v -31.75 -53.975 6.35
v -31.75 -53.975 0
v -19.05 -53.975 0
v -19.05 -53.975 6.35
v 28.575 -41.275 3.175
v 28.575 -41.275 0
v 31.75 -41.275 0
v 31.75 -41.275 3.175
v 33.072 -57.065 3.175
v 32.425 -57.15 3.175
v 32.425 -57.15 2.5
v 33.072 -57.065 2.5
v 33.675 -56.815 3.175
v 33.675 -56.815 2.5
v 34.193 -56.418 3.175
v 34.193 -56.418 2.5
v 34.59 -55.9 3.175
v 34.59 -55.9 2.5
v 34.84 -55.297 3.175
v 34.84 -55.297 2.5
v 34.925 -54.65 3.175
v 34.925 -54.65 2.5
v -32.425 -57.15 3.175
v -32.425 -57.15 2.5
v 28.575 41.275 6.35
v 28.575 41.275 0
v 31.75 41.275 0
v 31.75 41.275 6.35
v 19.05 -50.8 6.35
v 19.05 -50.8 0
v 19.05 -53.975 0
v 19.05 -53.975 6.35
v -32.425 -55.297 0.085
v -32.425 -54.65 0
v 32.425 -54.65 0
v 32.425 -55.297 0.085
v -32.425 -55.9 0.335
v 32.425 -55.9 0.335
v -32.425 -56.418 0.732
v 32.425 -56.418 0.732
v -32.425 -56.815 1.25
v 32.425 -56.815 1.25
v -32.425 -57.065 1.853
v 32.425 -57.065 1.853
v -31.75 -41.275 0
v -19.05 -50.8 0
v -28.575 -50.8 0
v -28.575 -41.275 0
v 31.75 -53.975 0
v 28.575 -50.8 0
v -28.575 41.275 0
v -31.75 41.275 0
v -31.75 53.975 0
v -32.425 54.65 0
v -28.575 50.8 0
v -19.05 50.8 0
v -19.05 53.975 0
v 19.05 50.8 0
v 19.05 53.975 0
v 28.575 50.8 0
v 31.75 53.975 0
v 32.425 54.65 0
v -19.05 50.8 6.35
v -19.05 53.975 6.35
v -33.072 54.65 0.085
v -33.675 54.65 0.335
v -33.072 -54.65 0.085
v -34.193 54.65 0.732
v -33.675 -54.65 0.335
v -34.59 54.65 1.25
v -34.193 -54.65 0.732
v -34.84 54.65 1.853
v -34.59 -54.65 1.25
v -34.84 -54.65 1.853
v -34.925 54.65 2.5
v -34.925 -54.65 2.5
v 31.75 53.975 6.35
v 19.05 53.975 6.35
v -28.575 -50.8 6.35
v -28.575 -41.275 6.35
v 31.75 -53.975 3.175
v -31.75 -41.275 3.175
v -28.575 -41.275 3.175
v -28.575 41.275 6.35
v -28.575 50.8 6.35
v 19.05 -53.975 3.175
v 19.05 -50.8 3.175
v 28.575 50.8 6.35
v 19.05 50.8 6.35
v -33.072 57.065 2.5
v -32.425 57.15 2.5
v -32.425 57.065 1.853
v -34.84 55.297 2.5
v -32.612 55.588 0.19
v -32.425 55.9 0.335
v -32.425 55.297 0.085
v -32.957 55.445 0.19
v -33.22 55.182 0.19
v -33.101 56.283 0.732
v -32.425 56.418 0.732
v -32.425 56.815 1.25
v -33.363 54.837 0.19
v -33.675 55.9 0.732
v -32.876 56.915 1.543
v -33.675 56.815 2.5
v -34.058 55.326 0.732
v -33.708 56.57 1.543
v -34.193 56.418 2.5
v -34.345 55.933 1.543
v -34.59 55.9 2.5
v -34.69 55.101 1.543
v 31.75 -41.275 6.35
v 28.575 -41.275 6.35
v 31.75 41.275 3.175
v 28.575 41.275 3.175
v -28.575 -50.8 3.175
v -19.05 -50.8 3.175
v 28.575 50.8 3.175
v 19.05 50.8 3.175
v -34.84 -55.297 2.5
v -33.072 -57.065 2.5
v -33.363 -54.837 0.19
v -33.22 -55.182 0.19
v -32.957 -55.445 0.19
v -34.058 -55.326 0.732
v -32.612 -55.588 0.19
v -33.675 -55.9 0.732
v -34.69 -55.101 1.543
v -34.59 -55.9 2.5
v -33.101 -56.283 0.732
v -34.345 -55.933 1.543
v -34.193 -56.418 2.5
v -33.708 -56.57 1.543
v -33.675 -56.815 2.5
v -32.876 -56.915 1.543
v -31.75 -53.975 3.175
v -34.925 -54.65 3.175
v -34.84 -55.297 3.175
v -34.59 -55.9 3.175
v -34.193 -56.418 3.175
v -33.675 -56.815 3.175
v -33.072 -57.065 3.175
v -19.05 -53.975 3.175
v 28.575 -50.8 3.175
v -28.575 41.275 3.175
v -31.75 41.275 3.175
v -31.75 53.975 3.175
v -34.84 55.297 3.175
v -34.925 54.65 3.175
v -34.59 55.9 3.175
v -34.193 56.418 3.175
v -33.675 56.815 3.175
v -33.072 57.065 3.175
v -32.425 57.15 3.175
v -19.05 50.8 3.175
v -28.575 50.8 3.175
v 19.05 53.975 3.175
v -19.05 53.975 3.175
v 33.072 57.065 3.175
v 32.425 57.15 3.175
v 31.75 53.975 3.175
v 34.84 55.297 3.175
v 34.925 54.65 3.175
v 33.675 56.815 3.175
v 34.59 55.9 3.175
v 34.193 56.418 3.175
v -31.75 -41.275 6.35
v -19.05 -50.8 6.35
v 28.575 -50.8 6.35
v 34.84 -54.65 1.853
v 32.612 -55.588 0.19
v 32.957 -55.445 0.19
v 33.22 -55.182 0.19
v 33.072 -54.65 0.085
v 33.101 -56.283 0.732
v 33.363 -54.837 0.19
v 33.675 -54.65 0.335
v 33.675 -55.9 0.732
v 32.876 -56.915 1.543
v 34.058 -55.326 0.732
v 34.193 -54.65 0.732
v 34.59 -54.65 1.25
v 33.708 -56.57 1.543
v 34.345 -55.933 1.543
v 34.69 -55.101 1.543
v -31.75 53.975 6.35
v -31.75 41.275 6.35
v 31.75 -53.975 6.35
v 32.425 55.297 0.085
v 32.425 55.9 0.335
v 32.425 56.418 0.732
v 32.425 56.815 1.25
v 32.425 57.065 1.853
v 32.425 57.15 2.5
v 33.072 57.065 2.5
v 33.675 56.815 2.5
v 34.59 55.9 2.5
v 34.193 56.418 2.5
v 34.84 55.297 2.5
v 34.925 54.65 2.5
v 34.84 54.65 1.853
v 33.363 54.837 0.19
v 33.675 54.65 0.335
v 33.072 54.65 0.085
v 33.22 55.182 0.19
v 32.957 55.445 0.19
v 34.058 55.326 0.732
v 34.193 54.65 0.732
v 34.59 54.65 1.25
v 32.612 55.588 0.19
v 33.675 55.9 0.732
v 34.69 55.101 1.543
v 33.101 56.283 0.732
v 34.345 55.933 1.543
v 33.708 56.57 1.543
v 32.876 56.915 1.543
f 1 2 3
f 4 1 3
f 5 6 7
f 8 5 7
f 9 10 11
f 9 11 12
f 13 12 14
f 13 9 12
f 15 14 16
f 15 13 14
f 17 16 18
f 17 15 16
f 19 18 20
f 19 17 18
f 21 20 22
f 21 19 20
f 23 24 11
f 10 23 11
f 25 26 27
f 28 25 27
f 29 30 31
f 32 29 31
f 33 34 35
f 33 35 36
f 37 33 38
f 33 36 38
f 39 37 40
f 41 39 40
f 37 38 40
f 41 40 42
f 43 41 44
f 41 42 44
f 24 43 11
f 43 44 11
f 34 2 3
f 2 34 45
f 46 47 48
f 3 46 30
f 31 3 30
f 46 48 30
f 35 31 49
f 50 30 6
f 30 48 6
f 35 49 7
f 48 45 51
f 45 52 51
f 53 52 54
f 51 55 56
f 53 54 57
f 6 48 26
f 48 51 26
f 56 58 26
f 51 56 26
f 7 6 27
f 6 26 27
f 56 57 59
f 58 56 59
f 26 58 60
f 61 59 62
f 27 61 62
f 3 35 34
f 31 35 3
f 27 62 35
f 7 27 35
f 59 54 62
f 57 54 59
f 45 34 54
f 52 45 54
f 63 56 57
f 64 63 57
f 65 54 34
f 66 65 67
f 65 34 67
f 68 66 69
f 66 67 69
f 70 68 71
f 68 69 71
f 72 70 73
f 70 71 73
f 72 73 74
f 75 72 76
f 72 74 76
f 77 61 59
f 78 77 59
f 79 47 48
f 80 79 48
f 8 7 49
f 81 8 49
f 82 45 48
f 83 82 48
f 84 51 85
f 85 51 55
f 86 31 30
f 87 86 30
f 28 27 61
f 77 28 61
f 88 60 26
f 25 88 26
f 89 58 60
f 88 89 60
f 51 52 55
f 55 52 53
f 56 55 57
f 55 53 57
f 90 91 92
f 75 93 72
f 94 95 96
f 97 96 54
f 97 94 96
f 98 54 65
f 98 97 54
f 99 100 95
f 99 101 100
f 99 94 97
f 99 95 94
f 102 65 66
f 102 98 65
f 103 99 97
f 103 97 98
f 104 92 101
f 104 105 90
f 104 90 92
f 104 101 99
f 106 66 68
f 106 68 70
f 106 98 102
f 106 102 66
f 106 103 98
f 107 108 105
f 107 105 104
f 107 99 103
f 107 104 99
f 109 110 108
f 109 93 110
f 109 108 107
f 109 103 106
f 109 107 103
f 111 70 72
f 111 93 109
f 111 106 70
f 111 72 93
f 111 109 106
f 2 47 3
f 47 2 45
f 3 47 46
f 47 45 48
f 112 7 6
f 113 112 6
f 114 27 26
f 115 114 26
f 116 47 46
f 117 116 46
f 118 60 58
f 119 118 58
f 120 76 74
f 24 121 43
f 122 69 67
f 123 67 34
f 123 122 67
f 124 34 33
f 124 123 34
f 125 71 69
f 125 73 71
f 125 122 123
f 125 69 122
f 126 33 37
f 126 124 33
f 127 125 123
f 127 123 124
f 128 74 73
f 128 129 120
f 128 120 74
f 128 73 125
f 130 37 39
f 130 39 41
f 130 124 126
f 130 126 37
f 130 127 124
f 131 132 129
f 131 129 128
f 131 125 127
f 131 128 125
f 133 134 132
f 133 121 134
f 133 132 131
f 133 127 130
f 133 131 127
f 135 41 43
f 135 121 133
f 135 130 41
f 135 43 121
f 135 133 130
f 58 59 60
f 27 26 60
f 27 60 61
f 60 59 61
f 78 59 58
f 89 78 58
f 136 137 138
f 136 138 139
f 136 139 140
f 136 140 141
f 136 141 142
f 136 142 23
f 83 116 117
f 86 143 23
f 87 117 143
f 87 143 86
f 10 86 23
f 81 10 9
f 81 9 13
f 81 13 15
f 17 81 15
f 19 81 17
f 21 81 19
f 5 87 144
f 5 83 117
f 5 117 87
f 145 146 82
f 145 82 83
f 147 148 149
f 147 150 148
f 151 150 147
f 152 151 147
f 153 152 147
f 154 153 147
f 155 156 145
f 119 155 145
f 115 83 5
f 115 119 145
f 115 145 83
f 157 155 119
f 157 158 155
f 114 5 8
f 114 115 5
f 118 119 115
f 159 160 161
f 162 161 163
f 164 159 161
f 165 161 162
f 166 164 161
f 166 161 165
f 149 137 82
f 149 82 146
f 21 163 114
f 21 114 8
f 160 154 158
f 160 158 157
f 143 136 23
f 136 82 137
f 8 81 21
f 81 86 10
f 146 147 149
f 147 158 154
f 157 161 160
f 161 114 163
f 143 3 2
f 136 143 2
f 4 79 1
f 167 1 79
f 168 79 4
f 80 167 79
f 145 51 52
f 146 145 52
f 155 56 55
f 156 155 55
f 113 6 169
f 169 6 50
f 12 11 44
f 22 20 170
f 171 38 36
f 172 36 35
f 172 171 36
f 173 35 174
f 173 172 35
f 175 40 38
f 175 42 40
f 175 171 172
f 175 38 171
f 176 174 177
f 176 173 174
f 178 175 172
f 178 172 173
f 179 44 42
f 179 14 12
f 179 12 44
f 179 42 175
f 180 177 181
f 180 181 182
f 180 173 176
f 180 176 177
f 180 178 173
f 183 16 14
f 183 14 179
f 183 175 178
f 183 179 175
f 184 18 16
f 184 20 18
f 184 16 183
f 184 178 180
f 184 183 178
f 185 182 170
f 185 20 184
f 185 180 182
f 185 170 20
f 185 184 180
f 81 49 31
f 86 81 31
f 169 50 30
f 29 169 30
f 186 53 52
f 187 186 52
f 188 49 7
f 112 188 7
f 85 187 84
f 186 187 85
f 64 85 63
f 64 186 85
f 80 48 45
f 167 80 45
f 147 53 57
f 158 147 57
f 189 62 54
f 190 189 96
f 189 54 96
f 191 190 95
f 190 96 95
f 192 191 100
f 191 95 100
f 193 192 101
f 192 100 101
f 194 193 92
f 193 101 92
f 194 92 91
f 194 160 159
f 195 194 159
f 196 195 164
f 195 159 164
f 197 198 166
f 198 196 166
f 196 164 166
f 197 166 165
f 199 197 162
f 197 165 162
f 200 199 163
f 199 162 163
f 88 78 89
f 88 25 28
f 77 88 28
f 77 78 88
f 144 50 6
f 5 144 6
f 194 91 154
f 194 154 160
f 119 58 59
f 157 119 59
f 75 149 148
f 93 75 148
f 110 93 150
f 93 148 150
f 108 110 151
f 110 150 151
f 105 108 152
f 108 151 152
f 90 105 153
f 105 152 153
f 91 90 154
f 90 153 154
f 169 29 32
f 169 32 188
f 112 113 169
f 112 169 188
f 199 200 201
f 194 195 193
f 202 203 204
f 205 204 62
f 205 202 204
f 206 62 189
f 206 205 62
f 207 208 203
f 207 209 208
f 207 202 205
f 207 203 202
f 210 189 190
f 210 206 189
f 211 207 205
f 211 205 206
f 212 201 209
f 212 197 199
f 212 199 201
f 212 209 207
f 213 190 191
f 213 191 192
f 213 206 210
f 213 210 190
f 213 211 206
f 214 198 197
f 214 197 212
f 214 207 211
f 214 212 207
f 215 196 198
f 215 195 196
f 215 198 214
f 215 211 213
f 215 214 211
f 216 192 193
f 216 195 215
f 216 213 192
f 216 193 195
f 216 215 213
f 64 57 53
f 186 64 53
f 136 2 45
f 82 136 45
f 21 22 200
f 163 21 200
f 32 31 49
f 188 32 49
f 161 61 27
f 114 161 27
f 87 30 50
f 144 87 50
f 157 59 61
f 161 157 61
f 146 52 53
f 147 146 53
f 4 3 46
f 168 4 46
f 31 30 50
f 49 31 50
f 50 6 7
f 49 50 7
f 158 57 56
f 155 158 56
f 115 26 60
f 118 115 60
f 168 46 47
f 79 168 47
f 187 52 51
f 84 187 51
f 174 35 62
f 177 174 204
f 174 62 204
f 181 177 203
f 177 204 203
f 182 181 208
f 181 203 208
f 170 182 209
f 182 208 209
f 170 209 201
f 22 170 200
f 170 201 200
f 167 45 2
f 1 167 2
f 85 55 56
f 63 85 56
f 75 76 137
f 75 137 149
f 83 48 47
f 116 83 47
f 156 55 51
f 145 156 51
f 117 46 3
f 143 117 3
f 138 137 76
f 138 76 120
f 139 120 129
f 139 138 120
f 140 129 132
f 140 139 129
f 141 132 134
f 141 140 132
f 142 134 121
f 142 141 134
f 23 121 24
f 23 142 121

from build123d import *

# Parameters (mm, degrees)
F1_DEPTH = 6.35
F0_W     = 69.85
F0_H     = 114.3
F2_DEPTH = 3.175
F3_R     = 2.5
F4_R     = 2.5


with BuildPart() as f1:
    # F0 (on Top) → F1 (new body)
    with BuildSketch(Plane.XY):
        Polygon((-19.05, 53.975), (-31.75, 53.975), (-31.75, 41.275), (-28.575, 41.275), (-28.575, 50.8), (-19.05, 50.8), align=None)
    extrude(amount=F1_DEPTH)


with BuildPart() as f1b:
    # F0 (on Top) → F1, piece 2 (new body)
    with BuildSketch(Plane.XY):
        Polygon((31.75, 41.275), (31.75, 53.975), (19.05, 53.975), (19.05, 50.8), (28.575, 50.8), (28.575, 41.275), align=None)
    extrude(amount=F1_DEPTH)


with BuildPart() as f1c:
    # F0 (on Top) → F1, piece 3 (new body)
    with BuildSketch(Plane.XY):
        Polygon((31.75, -41.275), (28.575, -41.275), (28.575, -50.8), (19.05, -50.8), (19.05, -53.975), (31.75, -53.975), align=None)
    extrude(amount=F1_DEPTH)


with BuildPart() as f1d:
    # F0 (on Top) → F1, piece 4 (new body)
    with BuildSketch(Plane.XY):
        Polygon((-31.75, -41.275), (-31.75, -53.975), (-19.05, -53.975), (-19.05, -50.8), (-28.575, -50.8), (-28.575, -41.275), align=None)
    extrude(amount=F1_DEPTH)


with BuildPart() as f2:
    # F0 (on Top) → F2 (new body)
    with BuildSketch(Plane.XY):
        Rectangle(F0_W, F0_H)
        Polygon((-19.05, -53.975), (-31.75, -53.975), (-31.75, -41.275), (-28.575, -41.275), (-28.575, -50.8), (-19.05, -50.8), align=None, mode=Mode.SUBTRACT)
        Polygon((28.575, -50.8), (28.575, -41.275), (31.75, -41.275), (31.75, -53.975), (19.05, -53.975), (19.05, -50.8), align=None, mode=Mode.SUBTRACT)
        Polygon((-31.75, 41.275), (-31.75, 53.975), (-19.05, 53.975), (-19.05, 50.8), (-28.575, 50.8), (-28.575, 41.275), align=None, mode=Mode.SUBTRACT)
        Polygon((19.05, 53.975), (31.75, 53.975), (31.75, 41.275), (28.575, 41.275), (28.575, 50.8), (19.05, 50.8), align=None, mode=Mode.SUBTRACT)
    extrude(amount=F2_DEPTH)

    # F3
    f3_edges = [f2.edges().sort_by_distance(p)[0] for p in [
        (-34.925, -57.15, 1.5875),
        (-34.925, 57.15, 1.5875),
        (34.925, 57.15, 1.5875),
        (34.925, -57.15, 1.5875),
    ]]
    fillet(f3_edges, radius=F3_R)

    # F4
    f4_edges = [f2.edges().sort_by_distance(p)[0] for p in [
        (0, -57.15, 0),
        (34.192767, -56.417767, 0),
        (34.925, 0, 0),
        (34.192767, 56.417767, 0),
        (-34.925, 0, 0),
        (-34.192767, -56.417767, 0),
        (0, 57.15, 0),
        (-34.192767, 56.417767, 0),
    ]]
    fillet(f4_edges, radius=F4_R)


solid = Compound([f1.part, f1b.part, f1c.part, f1d.part, f2.part])
